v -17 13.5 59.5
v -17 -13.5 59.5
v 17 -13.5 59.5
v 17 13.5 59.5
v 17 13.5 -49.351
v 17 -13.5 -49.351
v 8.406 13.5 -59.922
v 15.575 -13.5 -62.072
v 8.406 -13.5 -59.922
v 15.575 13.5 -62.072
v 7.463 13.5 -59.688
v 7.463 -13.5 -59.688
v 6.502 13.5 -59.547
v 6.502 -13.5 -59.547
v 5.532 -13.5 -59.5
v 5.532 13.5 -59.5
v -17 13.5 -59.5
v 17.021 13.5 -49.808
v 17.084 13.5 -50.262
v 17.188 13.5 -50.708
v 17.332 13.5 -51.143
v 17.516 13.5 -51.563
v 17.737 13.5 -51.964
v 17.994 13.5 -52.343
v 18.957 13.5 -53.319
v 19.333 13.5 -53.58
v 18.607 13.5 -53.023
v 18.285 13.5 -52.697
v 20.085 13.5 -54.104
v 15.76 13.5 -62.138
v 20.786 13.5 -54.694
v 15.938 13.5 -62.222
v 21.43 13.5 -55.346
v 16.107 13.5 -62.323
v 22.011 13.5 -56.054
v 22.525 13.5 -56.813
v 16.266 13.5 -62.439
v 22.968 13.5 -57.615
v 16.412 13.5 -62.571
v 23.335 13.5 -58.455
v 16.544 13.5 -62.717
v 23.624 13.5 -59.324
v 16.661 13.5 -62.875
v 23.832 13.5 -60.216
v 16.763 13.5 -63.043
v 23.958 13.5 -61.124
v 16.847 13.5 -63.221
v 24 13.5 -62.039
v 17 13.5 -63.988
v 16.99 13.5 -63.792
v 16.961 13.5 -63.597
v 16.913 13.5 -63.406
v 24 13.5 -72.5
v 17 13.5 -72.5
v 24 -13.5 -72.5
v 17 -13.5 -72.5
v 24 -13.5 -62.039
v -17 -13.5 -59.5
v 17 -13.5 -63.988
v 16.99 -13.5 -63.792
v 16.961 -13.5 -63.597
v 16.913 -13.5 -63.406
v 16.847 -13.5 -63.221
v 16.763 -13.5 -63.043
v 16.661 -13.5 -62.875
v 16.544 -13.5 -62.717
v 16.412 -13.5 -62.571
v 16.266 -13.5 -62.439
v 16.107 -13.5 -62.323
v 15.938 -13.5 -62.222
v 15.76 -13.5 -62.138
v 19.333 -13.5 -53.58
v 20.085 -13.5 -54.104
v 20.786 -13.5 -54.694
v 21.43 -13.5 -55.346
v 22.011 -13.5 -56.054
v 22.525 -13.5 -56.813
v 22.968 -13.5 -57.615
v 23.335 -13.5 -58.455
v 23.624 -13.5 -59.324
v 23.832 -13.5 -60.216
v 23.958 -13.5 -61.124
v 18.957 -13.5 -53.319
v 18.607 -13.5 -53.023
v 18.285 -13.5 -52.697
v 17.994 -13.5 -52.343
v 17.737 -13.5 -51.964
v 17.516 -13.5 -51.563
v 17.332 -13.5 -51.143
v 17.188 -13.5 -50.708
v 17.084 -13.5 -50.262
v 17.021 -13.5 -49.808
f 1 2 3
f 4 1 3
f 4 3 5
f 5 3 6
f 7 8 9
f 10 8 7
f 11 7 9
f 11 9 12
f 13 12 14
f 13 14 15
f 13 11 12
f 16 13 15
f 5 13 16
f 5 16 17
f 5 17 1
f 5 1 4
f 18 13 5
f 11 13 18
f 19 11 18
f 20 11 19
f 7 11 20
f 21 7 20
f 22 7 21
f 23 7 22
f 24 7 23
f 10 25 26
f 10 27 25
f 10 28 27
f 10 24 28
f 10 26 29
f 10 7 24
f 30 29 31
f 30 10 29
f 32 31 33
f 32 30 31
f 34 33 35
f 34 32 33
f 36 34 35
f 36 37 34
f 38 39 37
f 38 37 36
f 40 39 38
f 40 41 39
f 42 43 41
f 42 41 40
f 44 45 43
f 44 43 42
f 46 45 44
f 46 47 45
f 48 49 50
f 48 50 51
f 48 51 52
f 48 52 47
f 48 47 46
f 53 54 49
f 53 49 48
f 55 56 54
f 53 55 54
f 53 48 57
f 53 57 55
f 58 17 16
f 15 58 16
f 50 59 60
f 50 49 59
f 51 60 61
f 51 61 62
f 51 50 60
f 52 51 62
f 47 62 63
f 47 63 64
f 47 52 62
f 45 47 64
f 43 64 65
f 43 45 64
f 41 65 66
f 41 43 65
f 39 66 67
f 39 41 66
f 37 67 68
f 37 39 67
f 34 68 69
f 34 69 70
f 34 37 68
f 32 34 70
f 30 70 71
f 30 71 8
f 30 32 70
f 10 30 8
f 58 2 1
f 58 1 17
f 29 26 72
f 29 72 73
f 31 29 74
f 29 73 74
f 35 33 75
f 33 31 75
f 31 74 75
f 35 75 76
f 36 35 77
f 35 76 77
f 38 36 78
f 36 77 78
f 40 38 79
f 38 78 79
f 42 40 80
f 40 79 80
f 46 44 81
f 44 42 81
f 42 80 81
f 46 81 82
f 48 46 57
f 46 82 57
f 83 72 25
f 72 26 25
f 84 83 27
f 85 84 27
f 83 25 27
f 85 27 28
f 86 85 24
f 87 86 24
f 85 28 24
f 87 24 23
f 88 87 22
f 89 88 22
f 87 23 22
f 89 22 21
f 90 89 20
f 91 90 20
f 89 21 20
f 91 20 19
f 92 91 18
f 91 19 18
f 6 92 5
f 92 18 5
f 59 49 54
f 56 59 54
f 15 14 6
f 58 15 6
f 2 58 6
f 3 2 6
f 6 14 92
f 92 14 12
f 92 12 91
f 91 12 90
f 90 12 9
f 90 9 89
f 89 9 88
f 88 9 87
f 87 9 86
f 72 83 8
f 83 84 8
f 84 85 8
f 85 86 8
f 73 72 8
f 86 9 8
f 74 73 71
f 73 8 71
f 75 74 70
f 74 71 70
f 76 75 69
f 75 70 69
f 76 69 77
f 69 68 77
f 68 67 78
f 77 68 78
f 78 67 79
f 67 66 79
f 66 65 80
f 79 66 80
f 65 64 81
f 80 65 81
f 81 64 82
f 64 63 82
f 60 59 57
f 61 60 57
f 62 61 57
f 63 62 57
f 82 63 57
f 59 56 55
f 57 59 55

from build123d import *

# Parameters (mm, degrees)
EXTRUDE_367_DEPTH      = 13.5
EXTRUDE_367_DEPTH_BACK = 13.5
SKETCH_1_W             = 34
SKETCH_1_H             = 119
SKETCH_2_W             = 20
SKETCH_2_H             = 27
EXTRUDE_574_DEPTH      = 7
CHAMFER_1_SIZE         = 10
CHAMFER_1_SIZE2        = 3
FILLET_2_R             = 10
FILLET_3_R             = 5
FILLET_4_R             = 2


with BuildPart() as part:
    # Эскиз1 → Extrude 367 (new, two sides: drawn at the far end of the back side and taken through both)
    with BuildSketch(Plane(origin=(0, 0, 0), x_dir=(1, 0, 0), z_dir=(0, 1, 0)).offset(-EXTRUDE_367_DEPTH_BACK)):
        Rectangle(SKETCH_1_W, SKETCH_1_H)
    extrude(amount=EXTRUDE_367_DEPTH + EXTRUDE_367_DEPTH_BACK)

    # Эскиз2 → Extrude 574 (add)
    with BuildSketch(Plane(origin=(17, 0, 0), x_dir=(0, 0, -1), z_dir=(1, 0, 0))):
        with Locations((62.5, 0)):
            Rectangle(SKETCH_2_W, SKETCH_2_H)
    extrude(amount=EXTRUDE_574_DEPTH)

    # Фаска1
    chamfer_1_edges = [part.edges().sort_by_distance(p)[0] for p in [
        (17, 0, -59.5),
    ]]
    chamfer_1_side = [part.faces().sort_by_distance(p)[0] for p in [
        (0, 0, -59.5),
    ]]
    chamfer(chamfer_1_edges, length=CHAMFER_1_SIZE, length2=CHAMFER_1_SIZE2, reference=chamfer_1_side[0])

    # Скругление2
    # the kernel refuses this fillet: 10 mm, written as the material it adds along each edge
    with BuildSketch(Plane(origin=(7, 13.5, -59.5), x_dir=(-1, 0, 0), z_dir=(0, -1, 0))) as fillet_2_piece_1:
        with BuildLine():
            CenterArc((FILLET_2_R * 0.146768836304, FILLET_2_R), FILLET_2_R, 253.300755766, 16.699244234)
            Line((-FILLET_2_R * 0.140579049263, FILLET_2_R * 0.0421737147788), (0, 0))
            Line((0, 0), (FILLET_2_R * 0.146768836304, 0))
        make_face()
    extrude(amount=27)
    # the kernel refuses this fillet: 10 mm, written as the material it takes off along each edge
    with BuildSketch(Plane(origin=(24, -37.348480035, -52.5), x_dir=(0, 0, -1), z_dir=(0, 1, 0))) as fillet_2_2_piece_1:
        with BuildLine():
            CenterArc((9.539392014, 10), FILLET_2_R, 197.457603124, 72.542396876)
            Line((0, 7), (0, 0))
            Line((0, 0), (9.539392014, 0))
        make_face()
    extrude(amount=74.696960071, mode=Mode.SUBTRACT)

    # Скругление3
    fillet_3_edges = [part.edges().sort_by_distance(p)[0] for p in [
        (17, 0, -52.5),
    ]]
    fillet(fillet_3_edges, radius=FILLET_3_R)

    # Скругление4
    fillet_4_edges = [part.edges().sort_by_distance(p)[0] for p in [
        (17, 0, -62.5),
    ]]
    fillet(fillet_4_edges, radius=FILLET_4_R)


solid = part.part
